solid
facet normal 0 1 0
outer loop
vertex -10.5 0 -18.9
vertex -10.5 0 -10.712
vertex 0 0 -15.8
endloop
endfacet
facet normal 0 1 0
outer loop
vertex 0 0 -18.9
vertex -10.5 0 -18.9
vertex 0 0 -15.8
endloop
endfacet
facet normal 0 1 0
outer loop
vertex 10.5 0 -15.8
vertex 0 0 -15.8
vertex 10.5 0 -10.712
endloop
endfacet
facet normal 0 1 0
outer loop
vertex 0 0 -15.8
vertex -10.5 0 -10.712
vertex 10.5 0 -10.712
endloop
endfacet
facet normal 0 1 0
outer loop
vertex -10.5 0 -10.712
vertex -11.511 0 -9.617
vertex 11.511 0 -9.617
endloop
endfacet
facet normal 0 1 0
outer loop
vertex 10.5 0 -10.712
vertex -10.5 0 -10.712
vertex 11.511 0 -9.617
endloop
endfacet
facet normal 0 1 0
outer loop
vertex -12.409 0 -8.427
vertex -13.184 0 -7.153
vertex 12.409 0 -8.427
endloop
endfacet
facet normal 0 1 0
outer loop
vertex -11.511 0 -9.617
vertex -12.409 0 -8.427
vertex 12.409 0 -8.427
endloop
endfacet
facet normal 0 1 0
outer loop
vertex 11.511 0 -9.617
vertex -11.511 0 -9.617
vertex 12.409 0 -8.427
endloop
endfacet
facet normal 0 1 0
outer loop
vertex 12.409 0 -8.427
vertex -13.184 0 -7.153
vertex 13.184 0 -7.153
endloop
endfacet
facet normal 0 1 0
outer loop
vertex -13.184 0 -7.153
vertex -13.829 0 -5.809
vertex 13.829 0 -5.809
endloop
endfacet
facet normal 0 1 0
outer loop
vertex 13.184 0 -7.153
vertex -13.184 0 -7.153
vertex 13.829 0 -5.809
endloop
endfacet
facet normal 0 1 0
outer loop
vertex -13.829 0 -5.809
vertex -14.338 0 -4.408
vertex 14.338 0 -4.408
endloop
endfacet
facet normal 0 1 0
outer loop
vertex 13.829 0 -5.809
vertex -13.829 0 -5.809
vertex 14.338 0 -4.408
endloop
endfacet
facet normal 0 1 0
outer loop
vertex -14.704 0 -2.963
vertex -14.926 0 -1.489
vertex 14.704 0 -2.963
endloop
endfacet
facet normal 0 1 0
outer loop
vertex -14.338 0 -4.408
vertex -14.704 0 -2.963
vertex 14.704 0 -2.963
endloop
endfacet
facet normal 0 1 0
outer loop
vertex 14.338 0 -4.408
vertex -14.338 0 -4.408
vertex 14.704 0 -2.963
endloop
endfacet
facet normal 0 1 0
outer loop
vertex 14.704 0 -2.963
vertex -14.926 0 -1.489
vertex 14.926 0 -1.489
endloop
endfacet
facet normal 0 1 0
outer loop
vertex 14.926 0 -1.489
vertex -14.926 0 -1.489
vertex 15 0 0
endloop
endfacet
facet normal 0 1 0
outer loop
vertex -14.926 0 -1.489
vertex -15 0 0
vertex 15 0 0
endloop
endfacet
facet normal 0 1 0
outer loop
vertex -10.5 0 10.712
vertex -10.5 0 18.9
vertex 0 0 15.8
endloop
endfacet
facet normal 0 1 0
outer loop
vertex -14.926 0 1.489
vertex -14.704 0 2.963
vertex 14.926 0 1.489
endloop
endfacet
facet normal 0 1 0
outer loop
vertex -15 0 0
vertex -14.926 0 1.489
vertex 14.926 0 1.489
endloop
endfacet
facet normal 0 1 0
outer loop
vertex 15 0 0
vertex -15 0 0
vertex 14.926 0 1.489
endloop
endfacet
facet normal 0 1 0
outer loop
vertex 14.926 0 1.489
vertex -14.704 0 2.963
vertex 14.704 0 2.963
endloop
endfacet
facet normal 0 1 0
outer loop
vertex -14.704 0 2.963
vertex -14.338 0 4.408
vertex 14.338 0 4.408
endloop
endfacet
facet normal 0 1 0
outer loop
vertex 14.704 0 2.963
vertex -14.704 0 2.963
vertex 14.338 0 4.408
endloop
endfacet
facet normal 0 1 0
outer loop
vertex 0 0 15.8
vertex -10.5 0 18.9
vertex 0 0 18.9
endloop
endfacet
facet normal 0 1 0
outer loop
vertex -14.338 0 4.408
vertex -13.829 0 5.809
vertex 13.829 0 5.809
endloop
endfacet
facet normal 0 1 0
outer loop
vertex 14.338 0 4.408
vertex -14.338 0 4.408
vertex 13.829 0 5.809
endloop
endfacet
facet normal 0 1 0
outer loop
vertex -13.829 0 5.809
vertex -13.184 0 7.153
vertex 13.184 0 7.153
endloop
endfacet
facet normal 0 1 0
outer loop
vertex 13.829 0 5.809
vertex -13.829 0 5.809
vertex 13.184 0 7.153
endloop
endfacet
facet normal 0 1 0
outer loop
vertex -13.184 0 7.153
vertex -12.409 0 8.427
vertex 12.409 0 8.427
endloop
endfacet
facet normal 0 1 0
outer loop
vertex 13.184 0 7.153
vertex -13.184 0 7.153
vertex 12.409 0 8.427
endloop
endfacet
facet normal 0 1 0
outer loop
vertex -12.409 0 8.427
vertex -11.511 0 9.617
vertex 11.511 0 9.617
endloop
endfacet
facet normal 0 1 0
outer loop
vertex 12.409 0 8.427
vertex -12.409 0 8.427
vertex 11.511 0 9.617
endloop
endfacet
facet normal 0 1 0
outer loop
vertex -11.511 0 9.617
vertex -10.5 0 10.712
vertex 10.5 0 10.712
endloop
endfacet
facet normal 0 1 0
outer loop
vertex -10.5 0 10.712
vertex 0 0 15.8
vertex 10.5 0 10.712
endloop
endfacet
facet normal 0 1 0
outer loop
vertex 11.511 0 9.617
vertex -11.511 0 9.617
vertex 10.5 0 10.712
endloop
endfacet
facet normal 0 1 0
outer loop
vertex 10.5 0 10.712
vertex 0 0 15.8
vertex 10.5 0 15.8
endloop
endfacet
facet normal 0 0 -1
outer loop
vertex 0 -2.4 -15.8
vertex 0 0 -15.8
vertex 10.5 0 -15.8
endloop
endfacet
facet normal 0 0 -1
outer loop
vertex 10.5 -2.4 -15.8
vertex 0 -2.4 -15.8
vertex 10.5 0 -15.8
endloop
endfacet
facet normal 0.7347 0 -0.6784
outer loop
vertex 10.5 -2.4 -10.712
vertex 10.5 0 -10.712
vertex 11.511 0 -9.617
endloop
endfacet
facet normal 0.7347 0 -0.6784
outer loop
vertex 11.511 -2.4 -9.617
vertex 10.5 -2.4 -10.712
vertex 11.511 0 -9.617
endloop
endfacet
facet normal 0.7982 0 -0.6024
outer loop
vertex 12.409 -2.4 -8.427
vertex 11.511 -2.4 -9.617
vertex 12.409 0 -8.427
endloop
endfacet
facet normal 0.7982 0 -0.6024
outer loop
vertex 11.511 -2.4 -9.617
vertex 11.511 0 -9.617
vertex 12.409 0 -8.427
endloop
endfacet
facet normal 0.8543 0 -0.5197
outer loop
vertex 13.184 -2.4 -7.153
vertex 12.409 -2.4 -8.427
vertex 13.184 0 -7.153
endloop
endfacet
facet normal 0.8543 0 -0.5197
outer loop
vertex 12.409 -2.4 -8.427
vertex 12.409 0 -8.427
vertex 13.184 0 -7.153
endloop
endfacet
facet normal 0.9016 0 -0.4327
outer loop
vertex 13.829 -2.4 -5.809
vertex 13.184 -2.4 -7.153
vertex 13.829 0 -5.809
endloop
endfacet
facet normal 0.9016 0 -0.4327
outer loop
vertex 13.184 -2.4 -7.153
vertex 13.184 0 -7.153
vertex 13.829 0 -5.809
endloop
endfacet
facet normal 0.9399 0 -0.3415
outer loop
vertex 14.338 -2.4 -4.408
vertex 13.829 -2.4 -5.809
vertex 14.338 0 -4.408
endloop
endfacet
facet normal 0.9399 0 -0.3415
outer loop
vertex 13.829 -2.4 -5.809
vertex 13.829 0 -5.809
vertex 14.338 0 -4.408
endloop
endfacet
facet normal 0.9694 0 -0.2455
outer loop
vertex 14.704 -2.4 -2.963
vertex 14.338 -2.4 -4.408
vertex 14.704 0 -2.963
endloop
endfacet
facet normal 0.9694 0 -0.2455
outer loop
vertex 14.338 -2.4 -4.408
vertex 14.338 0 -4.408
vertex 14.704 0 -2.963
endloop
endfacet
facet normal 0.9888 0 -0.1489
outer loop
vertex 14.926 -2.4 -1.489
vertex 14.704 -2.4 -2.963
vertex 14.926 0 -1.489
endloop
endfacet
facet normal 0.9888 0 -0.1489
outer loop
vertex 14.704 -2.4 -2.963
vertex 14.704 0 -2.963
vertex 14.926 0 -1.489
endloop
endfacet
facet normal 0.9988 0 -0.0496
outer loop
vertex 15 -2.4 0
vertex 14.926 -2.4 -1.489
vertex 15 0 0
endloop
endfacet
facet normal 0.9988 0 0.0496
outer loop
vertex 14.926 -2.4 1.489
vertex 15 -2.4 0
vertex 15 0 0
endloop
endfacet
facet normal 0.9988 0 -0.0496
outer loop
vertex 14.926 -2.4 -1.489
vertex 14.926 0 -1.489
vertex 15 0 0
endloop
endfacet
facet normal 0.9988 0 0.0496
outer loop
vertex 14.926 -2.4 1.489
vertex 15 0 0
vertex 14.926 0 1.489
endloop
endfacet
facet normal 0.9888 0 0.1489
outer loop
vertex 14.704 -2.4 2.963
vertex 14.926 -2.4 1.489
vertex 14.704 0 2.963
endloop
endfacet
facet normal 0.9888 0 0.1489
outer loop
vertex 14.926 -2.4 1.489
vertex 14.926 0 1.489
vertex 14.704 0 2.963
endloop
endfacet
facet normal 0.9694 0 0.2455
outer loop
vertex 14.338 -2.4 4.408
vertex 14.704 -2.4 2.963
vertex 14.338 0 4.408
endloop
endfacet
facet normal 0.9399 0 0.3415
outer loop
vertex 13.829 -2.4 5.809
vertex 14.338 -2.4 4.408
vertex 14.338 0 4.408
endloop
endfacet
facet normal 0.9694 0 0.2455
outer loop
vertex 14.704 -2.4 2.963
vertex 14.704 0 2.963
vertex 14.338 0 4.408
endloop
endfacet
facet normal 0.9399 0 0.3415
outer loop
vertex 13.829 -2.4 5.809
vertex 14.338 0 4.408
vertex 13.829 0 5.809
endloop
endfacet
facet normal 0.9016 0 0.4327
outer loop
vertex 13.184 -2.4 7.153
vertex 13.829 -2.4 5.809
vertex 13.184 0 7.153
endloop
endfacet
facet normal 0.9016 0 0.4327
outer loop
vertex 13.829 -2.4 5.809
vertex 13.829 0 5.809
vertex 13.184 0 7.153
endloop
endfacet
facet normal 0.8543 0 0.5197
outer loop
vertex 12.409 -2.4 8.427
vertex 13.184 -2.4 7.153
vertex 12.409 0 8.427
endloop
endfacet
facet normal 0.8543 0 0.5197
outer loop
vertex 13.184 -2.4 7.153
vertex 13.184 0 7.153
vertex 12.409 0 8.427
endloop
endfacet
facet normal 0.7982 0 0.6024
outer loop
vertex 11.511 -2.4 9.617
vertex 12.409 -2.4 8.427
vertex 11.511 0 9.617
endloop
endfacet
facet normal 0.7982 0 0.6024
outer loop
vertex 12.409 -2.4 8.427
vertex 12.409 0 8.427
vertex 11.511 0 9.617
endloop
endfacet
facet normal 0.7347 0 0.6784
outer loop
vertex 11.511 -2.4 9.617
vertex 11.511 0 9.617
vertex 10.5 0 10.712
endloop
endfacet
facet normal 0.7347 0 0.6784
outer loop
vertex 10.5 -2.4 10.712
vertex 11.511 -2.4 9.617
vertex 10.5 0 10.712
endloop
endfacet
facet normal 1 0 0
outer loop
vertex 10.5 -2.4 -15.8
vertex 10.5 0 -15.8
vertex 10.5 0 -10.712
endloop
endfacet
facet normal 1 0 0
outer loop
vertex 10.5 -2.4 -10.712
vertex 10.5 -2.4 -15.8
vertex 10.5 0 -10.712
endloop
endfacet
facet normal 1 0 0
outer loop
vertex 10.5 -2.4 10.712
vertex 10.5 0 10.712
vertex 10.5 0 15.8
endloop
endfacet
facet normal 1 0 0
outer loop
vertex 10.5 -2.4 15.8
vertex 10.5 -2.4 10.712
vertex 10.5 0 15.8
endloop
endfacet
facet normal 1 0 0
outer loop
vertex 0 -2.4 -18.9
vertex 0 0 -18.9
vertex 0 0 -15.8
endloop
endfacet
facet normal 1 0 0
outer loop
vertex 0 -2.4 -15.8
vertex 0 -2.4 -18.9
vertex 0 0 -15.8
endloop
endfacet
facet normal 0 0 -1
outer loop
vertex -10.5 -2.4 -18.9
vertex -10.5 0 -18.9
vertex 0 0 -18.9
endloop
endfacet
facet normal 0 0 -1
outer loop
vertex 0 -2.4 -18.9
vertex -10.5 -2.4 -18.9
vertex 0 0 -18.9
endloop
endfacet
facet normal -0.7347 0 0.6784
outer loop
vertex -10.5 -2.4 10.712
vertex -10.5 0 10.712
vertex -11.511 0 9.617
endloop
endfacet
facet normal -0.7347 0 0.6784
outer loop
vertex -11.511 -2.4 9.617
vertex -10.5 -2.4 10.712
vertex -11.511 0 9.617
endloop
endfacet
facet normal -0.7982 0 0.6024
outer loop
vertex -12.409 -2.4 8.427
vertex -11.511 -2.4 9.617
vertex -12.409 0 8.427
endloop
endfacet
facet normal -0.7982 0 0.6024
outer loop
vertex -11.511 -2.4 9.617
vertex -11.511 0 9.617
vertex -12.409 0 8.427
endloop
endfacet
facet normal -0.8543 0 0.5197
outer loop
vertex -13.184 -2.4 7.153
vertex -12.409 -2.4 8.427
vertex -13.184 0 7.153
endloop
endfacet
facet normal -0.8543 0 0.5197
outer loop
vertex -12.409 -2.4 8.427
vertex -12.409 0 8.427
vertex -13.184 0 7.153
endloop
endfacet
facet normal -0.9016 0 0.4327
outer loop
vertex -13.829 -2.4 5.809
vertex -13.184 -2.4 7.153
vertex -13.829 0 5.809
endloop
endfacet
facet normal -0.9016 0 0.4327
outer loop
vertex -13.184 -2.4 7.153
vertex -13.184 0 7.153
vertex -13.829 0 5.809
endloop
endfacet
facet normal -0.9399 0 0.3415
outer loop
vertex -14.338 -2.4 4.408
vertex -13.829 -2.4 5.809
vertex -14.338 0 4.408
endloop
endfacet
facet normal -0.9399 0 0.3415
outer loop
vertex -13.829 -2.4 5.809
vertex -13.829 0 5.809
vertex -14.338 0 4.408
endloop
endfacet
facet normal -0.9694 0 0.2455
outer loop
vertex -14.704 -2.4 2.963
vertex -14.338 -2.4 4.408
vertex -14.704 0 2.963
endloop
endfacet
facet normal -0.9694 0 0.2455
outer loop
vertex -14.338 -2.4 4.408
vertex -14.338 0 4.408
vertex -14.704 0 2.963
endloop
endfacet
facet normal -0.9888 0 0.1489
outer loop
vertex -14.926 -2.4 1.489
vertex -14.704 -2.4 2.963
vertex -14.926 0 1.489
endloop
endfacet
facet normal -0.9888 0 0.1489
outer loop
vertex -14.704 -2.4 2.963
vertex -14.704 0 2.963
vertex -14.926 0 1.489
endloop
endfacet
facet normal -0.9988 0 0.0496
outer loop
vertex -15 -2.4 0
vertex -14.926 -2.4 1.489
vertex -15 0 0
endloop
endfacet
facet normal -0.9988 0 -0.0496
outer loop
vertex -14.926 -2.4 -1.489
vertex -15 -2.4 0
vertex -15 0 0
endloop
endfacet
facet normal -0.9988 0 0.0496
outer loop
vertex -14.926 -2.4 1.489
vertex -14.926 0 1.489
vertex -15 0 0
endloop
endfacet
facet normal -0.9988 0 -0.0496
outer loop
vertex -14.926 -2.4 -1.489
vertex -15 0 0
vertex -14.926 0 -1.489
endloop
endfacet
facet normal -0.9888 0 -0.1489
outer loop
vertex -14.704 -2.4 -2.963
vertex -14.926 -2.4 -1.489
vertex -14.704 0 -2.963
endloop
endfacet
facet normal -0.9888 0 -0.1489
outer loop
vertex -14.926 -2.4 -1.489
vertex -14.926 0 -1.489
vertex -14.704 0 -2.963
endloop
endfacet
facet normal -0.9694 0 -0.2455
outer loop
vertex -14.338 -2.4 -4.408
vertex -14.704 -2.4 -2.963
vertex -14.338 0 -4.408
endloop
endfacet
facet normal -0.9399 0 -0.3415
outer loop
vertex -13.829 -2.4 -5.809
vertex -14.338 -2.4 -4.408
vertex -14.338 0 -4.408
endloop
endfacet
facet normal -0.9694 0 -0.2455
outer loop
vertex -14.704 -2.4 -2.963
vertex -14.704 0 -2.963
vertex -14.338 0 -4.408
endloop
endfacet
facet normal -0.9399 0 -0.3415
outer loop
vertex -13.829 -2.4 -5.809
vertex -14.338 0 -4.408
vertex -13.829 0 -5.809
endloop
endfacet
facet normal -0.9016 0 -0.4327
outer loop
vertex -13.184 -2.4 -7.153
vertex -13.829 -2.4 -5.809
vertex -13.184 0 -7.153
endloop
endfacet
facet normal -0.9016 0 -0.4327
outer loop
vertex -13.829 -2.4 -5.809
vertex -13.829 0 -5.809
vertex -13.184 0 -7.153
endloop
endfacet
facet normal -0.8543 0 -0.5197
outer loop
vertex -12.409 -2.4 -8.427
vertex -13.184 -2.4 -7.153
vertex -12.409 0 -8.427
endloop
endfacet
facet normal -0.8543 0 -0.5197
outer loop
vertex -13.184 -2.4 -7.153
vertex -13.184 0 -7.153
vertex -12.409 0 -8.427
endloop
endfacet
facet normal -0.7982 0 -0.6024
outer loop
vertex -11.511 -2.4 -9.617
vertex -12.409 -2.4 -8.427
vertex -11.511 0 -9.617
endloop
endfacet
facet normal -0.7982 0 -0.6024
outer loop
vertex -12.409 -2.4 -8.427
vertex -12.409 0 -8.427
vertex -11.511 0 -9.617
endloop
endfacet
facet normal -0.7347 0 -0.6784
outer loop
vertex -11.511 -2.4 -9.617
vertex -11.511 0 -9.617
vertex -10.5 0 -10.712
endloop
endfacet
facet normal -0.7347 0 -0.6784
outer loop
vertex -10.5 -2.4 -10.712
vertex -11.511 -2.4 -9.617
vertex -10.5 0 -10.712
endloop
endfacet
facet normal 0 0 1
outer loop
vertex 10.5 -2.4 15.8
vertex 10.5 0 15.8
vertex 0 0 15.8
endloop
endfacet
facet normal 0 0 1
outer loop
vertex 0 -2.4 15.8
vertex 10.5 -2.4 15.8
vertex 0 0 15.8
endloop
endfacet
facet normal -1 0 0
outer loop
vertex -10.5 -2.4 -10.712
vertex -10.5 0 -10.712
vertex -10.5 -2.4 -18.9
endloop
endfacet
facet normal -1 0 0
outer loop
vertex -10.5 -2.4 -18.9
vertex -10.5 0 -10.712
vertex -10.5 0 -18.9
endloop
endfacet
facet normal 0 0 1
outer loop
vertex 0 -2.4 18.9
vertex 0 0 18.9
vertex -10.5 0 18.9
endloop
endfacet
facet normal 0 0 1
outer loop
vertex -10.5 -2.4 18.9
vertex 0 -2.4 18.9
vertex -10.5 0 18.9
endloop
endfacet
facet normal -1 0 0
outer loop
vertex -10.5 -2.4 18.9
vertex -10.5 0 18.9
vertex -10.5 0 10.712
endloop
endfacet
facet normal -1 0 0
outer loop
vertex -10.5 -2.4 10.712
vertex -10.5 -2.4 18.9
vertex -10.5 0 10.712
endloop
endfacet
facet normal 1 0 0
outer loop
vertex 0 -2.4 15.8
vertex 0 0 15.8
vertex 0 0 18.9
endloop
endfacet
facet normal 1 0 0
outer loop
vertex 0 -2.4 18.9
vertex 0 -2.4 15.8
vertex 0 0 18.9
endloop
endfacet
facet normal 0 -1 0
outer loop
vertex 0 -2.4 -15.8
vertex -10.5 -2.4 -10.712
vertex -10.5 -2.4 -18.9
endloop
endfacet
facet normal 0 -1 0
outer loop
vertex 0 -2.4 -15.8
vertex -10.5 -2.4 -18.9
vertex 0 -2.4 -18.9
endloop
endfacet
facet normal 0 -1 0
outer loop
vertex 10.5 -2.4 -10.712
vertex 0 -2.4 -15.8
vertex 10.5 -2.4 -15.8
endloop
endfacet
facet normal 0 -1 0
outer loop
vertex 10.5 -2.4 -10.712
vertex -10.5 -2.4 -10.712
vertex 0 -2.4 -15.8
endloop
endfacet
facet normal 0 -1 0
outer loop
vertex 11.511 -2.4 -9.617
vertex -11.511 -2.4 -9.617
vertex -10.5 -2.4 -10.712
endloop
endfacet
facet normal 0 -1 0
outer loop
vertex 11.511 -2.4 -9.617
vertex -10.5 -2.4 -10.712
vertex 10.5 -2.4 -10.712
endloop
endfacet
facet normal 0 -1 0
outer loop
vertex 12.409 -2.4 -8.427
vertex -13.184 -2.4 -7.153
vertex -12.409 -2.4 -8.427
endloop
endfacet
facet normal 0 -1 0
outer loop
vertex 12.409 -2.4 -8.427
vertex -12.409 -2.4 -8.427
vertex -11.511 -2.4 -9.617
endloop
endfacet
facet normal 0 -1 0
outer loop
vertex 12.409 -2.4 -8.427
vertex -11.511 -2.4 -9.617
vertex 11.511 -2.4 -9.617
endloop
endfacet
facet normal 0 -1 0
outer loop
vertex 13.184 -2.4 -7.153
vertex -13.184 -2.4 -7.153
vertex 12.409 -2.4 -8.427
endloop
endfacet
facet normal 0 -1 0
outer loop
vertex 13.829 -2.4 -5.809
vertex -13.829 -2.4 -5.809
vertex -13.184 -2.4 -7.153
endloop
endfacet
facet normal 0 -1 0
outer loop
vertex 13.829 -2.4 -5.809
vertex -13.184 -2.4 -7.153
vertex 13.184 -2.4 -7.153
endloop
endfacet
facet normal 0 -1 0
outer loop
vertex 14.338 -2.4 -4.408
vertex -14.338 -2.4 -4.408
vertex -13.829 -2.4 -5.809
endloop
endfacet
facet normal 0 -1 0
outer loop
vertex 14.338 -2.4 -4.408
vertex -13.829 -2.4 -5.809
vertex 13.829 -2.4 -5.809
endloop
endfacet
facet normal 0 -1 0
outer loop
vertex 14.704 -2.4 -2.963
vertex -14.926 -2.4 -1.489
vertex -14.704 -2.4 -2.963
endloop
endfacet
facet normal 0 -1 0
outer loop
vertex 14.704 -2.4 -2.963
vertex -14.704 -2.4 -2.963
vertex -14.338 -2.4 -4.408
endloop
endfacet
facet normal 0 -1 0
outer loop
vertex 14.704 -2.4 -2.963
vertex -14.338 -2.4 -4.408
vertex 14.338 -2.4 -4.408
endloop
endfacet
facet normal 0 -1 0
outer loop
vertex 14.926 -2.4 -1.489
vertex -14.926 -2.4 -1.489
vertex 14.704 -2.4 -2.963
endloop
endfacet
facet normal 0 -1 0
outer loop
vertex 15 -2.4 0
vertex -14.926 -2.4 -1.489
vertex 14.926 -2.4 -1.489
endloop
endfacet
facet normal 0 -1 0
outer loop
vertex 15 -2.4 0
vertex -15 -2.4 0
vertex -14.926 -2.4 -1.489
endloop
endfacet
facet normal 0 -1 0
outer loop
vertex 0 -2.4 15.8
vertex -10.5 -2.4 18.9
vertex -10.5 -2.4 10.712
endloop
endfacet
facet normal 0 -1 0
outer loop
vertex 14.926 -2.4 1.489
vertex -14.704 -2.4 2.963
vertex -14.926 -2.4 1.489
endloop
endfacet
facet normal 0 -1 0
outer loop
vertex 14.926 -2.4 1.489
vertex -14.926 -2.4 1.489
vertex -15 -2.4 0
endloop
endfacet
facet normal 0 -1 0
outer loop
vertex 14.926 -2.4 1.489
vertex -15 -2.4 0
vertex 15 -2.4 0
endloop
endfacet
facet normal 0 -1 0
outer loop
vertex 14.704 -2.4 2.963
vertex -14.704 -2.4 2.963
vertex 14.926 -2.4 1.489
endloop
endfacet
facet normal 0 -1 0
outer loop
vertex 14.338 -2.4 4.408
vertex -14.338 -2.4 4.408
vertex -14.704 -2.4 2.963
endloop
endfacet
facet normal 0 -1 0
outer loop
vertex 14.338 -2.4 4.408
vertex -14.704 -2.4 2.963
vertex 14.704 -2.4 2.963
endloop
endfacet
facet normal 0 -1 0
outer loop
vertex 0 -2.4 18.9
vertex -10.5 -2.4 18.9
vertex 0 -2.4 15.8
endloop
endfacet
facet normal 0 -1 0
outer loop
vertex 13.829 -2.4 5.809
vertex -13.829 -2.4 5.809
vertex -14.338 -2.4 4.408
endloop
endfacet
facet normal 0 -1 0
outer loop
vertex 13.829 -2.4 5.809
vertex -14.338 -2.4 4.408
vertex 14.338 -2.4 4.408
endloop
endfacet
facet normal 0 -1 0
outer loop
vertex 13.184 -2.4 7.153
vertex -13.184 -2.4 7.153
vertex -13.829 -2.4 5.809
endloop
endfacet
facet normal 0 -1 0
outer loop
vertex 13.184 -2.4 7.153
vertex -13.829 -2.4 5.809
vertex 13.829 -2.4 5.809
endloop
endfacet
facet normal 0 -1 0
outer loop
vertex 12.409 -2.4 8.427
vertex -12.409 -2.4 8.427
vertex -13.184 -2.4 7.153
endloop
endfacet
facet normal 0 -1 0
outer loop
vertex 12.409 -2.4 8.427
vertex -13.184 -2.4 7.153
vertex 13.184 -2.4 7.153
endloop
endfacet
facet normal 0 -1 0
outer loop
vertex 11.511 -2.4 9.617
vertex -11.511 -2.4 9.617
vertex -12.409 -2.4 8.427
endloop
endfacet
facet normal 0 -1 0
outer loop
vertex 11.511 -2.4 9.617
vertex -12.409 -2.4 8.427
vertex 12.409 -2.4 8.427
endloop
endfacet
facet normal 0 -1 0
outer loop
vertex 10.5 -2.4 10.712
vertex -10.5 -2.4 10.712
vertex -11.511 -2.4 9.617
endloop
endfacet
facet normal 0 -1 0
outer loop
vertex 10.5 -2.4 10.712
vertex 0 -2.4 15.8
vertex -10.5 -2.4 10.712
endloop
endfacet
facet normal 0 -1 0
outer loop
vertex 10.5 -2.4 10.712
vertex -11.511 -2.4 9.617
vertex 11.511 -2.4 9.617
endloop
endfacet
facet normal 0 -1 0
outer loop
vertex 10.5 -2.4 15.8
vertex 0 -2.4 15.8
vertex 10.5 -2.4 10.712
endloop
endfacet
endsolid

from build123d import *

# Parameters (mm, degrees)
F1_DEPTH = 2.4


with BuildPart() as f1:
    # F0 (on Front) → F1 (new body)
    with BuildSketch(Plane.XZ):
        with BuildLine():
            Line((-10.5, 18.9), (-10.5, 10.712143))
            ThreePointArc((-10.5, 10.712143), (-15, 0), (-10.5, -10.712143))
            Line((-10.5, -10.712143), (-10.5, -18.9))
            Line((-10.5, -18.9), (0, -18.9))
            Line((0, -18.9), (0, -15.8))
            Line((0, -15.8), (10.5, -15.8))
            Line((10.5, -15.8), (10.5, -10.712143))
            ThreePointArc((10.5, -10.712143), (15, 0), (10.5, 10.712143))
            Line((10.5, 10.712143), (10.5, 15.8))
            Line((10.5, 15.8), (0, 15.8))
            Line((0, 15.8), (0, 18.9))
            Line((0, 18.9), (-10.5, 18.9))
        make_face()
    extrude(amount=F1_DEPTH)


solid = f1.part
